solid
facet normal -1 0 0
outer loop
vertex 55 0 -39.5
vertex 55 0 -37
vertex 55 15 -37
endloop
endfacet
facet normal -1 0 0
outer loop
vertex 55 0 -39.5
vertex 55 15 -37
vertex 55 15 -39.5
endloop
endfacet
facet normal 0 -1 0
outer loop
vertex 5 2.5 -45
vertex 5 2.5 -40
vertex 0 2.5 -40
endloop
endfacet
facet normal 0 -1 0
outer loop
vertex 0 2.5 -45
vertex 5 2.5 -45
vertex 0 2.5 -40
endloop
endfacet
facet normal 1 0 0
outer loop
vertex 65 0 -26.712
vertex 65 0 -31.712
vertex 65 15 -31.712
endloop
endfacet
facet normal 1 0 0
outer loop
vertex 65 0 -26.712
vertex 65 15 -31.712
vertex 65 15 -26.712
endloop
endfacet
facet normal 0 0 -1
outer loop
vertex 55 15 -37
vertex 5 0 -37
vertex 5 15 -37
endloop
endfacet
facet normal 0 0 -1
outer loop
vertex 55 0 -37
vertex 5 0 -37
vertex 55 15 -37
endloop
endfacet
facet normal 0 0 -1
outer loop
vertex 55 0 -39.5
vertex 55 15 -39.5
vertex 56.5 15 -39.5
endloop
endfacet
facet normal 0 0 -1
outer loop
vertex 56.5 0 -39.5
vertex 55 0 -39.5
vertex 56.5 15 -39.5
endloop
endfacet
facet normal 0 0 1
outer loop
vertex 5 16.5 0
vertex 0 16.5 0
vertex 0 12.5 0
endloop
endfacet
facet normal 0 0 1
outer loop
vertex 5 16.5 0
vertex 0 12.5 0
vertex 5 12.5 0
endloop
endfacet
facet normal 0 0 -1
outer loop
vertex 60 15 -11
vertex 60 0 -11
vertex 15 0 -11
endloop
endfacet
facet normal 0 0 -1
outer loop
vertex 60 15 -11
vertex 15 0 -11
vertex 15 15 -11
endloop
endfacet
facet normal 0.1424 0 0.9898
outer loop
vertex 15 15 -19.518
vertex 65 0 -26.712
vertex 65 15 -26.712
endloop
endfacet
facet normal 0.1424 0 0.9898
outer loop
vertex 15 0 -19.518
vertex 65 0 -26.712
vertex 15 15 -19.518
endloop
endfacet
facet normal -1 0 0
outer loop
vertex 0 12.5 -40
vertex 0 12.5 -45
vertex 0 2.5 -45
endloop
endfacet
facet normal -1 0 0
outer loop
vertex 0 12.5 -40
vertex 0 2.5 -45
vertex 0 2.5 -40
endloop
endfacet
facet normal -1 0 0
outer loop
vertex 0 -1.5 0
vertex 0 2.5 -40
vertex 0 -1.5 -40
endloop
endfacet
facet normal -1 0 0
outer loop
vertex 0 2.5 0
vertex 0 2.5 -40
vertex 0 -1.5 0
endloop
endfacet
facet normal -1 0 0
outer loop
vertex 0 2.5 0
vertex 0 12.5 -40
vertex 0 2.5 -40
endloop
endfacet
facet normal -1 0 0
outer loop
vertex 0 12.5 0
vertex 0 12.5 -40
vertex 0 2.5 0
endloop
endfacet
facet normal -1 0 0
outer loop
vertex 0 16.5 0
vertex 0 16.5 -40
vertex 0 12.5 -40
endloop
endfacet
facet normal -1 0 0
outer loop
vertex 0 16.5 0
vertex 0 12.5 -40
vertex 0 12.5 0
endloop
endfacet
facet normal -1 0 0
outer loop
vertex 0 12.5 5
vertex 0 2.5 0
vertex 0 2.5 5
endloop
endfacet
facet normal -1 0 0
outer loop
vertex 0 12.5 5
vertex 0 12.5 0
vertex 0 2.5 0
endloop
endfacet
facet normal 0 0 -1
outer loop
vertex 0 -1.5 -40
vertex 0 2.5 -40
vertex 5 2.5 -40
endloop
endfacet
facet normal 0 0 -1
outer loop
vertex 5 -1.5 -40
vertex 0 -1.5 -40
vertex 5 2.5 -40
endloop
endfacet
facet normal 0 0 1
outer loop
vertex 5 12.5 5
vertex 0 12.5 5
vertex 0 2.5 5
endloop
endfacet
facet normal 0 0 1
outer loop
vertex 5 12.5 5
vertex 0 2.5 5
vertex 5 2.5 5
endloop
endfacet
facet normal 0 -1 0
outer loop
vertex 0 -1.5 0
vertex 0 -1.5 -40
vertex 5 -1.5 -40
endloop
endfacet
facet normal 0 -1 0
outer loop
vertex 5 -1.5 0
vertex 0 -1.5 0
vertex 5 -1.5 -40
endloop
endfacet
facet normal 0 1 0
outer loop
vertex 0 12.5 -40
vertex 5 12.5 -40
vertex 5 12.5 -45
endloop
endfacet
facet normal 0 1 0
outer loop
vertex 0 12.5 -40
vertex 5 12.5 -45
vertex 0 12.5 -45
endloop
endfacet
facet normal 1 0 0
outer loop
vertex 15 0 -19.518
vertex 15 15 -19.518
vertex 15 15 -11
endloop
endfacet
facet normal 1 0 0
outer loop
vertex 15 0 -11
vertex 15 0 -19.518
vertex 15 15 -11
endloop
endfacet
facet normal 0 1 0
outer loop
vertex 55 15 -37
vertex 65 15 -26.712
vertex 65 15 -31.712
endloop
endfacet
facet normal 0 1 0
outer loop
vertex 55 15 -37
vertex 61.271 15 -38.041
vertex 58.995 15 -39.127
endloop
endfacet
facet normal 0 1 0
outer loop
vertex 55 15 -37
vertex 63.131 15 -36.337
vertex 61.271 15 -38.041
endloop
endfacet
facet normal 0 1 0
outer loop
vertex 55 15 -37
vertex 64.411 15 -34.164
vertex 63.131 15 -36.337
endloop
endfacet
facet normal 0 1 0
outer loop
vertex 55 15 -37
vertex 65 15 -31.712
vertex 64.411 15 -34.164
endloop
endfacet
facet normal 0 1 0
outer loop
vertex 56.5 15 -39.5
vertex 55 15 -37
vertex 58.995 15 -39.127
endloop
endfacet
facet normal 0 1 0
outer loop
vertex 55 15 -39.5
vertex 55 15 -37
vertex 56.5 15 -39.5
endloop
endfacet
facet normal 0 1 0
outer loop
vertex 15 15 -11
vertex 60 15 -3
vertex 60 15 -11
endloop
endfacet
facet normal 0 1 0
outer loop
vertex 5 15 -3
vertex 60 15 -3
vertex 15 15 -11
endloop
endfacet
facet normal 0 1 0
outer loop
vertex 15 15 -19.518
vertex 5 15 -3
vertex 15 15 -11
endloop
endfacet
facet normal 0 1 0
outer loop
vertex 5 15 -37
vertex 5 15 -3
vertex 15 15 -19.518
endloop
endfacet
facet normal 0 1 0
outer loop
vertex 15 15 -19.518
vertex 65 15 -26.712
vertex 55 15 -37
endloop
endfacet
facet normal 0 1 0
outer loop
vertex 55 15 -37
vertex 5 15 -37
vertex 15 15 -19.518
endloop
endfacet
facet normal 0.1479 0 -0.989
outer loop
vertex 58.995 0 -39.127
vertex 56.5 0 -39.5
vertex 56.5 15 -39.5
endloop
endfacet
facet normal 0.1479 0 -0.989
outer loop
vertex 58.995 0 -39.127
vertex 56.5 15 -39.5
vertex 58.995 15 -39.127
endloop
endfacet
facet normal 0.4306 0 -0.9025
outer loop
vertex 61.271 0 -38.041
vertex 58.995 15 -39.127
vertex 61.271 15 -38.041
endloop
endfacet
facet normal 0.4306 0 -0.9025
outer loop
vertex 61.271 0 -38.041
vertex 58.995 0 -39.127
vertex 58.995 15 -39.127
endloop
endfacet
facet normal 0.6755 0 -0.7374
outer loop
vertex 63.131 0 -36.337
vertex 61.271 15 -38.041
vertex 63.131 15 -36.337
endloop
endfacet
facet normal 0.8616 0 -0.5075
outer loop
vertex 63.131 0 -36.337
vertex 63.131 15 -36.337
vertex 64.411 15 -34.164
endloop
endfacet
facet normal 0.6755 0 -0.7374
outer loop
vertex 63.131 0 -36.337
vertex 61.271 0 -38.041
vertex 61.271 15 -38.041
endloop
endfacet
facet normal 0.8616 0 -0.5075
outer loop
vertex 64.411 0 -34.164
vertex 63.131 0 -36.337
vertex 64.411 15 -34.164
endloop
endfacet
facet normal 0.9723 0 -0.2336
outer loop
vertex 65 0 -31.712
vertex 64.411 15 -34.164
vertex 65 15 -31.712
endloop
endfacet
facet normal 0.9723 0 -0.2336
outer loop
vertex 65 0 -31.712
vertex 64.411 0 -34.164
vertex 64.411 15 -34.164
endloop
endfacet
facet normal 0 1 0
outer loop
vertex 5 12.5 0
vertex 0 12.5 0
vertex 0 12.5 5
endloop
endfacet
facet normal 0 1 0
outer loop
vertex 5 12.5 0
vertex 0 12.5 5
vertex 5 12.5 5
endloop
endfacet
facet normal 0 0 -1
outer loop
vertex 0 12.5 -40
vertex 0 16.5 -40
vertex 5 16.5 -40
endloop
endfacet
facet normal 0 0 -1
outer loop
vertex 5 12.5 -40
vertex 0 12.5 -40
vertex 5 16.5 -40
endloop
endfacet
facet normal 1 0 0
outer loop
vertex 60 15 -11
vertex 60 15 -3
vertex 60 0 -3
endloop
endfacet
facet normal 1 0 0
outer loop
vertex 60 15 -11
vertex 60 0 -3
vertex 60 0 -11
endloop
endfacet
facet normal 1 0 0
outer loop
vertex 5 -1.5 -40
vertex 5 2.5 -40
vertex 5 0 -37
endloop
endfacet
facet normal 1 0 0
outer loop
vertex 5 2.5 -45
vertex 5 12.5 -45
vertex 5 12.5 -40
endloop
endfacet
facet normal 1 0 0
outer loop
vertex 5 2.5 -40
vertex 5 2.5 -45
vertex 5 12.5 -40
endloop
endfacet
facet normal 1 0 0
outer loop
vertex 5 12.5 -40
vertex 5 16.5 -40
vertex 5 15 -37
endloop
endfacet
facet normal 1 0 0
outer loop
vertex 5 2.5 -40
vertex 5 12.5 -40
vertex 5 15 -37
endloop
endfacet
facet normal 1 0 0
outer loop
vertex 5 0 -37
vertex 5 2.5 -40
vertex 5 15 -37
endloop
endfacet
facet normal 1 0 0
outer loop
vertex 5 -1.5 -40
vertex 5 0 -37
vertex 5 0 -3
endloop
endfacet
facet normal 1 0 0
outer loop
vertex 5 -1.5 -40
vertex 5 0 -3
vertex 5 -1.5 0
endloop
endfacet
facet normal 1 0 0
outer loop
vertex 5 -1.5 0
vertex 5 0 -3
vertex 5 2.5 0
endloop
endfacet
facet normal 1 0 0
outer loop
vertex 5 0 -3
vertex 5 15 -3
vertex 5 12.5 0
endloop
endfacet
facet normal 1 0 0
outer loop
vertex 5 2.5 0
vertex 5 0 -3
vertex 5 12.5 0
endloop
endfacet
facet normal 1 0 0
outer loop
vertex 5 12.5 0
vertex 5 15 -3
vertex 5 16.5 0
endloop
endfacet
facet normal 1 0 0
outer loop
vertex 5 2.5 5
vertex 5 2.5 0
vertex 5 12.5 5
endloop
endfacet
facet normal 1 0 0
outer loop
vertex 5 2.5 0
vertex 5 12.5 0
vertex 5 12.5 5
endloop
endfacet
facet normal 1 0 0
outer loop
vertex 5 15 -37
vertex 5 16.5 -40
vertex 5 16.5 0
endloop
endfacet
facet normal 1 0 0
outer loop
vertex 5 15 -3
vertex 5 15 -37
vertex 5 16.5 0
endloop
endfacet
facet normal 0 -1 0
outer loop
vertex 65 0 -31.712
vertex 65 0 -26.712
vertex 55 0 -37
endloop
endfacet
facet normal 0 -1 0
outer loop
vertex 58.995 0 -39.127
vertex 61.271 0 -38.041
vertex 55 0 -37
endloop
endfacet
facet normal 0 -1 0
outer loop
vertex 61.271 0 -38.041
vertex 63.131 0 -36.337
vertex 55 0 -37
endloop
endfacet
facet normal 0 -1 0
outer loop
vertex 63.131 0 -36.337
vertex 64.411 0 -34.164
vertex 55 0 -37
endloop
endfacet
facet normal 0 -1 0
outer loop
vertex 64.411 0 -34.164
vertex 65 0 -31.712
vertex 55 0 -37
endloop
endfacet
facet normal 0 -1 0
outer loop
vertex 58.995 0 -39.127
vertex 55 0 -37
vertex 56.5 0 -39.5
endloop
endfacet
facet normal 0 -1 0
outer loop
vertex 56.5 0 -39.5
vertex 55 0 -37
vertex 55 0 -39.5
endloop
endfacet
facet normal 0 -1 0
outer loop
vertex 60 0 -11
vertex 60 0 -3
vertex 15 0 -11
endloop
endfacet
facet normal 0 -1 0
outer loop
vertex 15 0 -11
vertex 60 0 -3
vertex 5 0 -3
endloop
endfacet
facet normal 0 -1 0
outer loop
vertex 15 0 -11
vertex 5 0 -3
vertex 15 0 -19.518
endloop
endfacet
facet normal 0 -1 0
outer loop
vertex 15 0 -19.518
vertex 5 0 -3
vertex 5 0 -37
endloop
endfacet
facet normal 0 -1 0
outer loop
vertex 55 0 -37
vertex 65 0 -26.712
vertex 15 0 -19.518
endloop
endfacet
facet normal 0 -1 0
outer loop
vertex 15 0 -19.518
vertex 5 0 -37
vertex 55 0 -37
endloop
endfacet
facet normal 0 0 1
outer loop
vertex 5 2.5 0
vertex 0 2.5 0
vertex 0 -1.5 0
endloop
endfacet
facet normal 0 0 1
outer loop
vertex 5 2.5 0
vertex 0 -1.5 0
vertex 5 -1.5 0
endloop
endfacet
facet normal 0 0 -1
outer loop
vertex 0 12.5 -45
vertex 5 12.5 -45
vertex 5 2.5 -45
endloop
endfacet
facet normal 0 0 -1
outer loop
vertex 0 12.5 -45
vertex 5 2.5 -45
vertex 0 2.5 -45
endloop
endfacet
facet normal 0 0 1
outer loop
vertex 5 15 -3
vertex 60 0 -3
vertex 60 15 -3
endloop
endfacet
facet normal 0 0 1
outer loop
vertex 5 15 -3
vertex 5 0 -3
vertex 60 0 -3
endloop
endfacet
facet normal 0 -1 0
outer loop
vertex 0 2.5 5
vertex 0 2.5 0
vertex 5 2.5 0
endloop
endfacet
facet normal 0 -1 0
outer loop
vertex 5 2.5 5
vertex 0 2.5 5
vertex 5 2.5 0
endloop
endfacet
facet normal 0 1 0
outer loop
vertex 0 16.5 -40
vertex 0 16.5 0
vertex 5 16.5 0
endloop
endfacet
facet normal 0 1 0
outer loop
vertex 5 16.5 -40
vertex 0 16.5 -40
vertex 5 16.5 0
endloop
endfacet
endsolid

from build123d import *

# Parameters (mm, degrees)
BOSS_EXTRUDE1_DEPTH = 15
SKETCH4_W           = 5
SKETCH4_H           = 40
BOSS_EXTRUDE2_DEPTH = 1.5
SKETCH5_W           = 5
SKETCH5_H           = 40
BOSS_EXTRUDE3_DEPTH = 1.5
SKETCH6_W           = 8
SKETCH6_H           = 15
BOSS_EXTRUDE4_DEPTH = 45
SKETCH7_W           = 5
SKETCH7_H           = 10
BOSS_EXTRUDE5_DEPTH = 5
SKETCH8_W           = 5
SKETCH8_H           = 10
BOSS_EXTRUDE6_DEPTH = 5


with BuildPart() as part:
    # Sketch2 → Boss-Extrude1 (new body)
    with BuildSketch(Plane(origin=(0, 0, 0), x_dir=(1, 0, 0), z_dir=(0, 1, 0))):
        with BuildLine():
            Line((0, 0), (0, 40))
            Line((0, 40), (5, 40))
            Line((5, 40), (5, 37))
            Line((5, 37), (55, 37))
            Line((55, 37), (55, 39.5))
            Line((55, 39.5), (56.5, 39.5))
            ThreePointArc((56.5, 39.5), (62.264260255, 37.258522387), (65, 31.711753397))
            Line((65, 31.711753397), (65, 26.711753397))
            Line((65, 26.711753397), (15, 19.51828483))
            Line((15, 19.51828483), (15, 3))
            Line((15, 3), (5, 3))
            Line((5, 3), (5, 0))
            Line((5, 0), (0, 0))
        make_face()
    extrude(amount=BOSS_EXTRUDE1_DEPTH)

    # Sketch4 → Boss-Extrude2 (add)
    with BuildSketch(Plane(origin=(0, 15, 0), x_dir=(1, 0, 0), z_dir=(0, 1, 0))):
        with Locations((2.5, 20)):
            Rectangle(SKETCH4_W, SKETCH4_H)
    extrude(amount=BOSS_EXTRUDE2_DEPTH)

    # Sketch5 → Boss-Extrude3 (add)
    with BuildSketch(Plane.XZ):
        with Locations((2.5, -20)):
            Rectangle(SKETCH5_W, SKETCH5_H)
    extrude(amount=BOSS_EXTRUDE3_DEPTH)

    # Sketch6 → Boss-Extrude4 (add)
    with BuildSketch(Plane(origin=(15, 0, 0), x_dir=(0, 0, -1), z_dir=(1, 0, 0))):
        with Locations((7, 7.5)):
            Rectangle(SKETCH6_W, SKETCH6_H)
    extrude(amount=BOSS_EXTRUDE4_DEPTH)

    # Sketch7 → Boss-Extrude5 (add)
    with BuildSketch(Plane.XY):
        with Locations((2.5, 7.5)):
            Rectangle(SKETCH7_W, SKETCH7_H)
    extrude(amount=BOSS_EXTRUDE5_DEPTH)

    # Sketch8 → Boss-Extrude6 (add)
    with BuildSketch(Plane(origin=(0, 0, -40), x_dir=(-1, 0, 0), z_dir=(0, 0, -1))):
        with Locations((-2.5, 7.5)):
            Rectangle(SKETCH8_W, SKETCH8_H)
    extrude(amount=BOSS_EXTRUDE6_DEPTH)


solid = part.part
